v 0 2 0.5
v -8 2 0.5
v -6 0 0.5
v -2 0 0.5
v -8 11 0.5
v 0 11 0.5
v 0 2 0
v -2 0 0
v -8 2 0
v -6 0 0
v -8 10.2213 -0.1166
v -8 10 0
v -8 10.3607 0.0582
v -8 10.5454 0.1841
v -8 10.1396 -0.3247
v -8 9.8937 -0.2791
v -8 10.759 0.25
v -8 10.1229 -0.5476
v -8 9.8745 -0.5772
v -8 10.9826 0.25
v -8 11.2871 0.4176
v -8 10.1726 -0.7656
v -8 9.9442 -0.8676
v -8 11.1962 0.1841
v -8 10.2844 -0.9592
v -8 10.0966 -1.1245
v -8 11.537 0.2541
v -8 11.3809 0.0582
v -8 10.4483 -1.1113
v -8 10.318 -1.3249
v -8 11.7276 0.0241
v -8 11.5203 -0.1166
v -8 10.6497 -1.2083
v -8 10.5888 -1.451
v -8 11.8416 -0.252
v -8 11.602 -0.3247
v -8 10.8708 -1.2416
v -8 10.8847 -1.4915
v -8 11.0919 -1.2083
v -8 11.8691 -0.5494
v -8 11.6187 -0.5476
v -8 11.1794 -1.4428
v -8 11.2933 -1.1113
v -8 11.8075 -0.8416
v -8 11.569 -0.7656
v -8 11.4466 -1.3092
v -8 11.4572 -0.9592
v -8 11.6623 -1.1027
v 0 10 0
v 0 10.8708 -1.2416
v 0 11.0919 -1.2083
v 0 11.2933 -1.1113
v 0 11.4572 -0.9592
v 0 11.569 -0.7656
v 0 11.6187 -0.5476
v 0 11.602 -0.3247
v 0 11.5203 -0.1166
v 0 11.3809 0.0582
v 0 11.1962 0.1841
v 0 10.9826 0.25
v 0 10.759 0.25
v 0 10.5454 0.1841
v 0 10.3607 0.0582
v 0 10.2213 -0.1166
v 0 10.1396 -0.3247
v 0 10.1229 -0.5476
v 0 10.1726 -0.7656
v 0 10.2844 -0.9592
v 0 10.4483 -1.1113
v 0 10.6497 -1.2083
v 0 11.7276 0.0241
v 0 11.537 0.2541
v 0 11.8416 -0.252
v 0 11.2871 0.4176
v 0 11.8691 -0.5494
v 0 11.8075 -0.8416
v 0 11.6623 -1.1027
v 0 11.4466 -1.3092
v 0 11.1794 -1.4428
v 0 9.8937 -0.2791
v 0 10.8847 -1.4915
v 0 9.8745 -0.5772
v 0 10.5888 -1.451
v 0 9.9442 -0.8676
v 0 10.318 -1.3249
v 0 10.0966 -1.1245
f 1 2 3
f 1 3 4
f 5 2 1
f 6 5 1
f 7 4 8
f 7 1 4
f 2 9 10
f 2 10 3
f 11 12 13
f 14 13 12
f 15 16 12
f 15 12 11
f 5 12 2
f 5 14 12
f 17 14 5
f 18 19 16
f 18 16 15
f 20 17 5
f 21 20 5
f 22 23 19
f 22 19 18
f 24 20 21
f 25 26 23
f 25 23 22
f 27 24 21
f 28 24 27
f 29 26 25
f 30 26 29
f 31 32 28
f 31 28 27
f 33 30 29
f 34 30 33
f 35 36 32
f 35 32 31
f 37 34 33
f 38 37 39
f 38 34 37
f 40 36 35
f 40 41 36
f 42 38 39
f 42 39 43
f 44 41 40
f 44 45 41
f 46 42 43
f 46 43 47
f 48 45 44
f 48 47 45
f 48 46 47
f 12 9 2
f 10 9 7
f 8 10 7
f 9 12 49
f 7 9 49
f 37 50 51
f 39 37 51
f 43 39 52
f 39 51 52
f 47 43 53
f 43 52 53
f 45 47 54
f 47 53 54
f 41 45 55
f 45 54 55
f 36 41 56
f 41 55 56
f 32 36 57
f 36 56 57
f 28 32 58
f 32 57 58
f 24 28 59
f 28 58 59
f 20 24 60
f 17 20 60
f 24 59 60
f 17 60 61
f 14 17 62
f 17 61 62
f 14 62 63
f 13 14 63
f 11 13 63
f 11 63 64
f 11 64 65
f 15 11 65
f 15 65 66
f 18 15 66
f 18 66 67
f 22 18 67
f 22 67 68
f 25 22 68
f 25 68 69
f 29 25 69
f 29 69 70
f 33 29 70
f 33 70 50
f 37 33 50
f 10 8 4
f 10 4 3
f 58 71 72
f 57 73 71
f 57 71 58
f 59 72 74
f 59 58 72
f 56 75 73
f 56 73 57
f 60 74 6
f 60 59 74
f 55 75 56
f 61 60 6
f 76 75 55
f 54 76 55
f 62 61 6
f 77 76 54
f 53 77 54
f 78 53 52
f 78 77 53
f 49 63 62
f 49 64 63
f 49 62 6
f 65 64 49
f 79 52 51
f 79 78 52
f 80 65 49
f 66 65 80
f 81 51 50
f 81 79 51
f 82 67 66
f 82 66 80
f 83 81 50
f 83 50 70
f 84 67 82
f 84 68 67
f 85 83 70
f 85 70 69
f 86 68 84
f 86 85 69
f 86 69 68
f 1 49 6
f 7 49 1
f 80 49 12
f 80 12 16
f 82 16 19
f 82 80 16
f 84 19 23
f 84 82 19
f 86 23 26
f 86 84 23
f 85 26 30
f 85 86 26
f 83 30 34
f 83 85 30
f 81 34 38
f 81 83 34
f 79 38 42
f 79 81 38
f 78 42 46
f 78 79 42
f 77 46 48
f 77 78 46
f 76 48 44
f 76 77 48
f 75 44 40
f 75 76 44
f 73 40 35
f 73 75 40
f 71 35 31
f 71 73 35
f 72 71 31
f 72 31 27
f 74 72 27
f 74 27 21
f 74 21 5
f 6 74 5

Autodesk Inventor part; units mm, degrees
ref_plane "YZ Plane" through (0, 0, 0) normal (1, 0, 0) x (0, 1, 0)
ref_plane "XZ Plane" through (0, 0, 0) normal (0, 1, 0) x (-1, 0, 0)
ref_plane "XY Plane" through (0, 0, 0) normal (0, 0, 1) x (1, 0, 0)
sketch "Sketch1" plane through (0, 0, 0) normal (0, 0, 1) x (1, 0, 0)
  line L0 (0, 0) -> (-8, 0)
  line L1 (-8, 0) -> (-8, 10)
  line L2 (-8, 10) -> (0, 10)
  line L3 (0, 10) -> (0, 0)
  dimension "d2" = 10
  dimension "d3" = 8
extrude "Extrusion1" add sketch "Sketch1" along normal blind 0.5
sketch "Sketch2" plane through (0, 0, 0) normal (1, 0, 0) x (0, 0, -1)
  line L0 (-0.5, 10) -> (-0.5, 11)
  arc A0 (0, 10) -> (-0.5, 11) centre (0.4916, 10.8708) ccw
  line L1 (0, 10) -> (-0.5, 10) projected
  line L2 (0, 10) -> (-0.5, 10)
  point P0 (0, 0)
  dimension "d4" = 1
  dimension "d5" = 1
extrude "Extrusion2" add sketch "Sketch2" against normal blind 8
sketch "Sketch3" plane through (0, 0, 0.5) normal (1, 0, 0) x (0, 0, -1)
  arc A0 (0.5, 10) -> (0, 11) centre (0.9916, 10.8708) ccw projected
  circle A1 centre (0.9916, 10.8708) radius 0.75
  point P0 (0.5, 0)
  dimension "d8" = 1.5
extrude "Extrusion3" cut sketch "Sketch3" against normal blind 8
chamfer "Chamfer1" distance 2 angle 45 2 edges at (-8, 0, 0.25) (0, 0, 0.25)
properties part number "Bottom_Trava"
